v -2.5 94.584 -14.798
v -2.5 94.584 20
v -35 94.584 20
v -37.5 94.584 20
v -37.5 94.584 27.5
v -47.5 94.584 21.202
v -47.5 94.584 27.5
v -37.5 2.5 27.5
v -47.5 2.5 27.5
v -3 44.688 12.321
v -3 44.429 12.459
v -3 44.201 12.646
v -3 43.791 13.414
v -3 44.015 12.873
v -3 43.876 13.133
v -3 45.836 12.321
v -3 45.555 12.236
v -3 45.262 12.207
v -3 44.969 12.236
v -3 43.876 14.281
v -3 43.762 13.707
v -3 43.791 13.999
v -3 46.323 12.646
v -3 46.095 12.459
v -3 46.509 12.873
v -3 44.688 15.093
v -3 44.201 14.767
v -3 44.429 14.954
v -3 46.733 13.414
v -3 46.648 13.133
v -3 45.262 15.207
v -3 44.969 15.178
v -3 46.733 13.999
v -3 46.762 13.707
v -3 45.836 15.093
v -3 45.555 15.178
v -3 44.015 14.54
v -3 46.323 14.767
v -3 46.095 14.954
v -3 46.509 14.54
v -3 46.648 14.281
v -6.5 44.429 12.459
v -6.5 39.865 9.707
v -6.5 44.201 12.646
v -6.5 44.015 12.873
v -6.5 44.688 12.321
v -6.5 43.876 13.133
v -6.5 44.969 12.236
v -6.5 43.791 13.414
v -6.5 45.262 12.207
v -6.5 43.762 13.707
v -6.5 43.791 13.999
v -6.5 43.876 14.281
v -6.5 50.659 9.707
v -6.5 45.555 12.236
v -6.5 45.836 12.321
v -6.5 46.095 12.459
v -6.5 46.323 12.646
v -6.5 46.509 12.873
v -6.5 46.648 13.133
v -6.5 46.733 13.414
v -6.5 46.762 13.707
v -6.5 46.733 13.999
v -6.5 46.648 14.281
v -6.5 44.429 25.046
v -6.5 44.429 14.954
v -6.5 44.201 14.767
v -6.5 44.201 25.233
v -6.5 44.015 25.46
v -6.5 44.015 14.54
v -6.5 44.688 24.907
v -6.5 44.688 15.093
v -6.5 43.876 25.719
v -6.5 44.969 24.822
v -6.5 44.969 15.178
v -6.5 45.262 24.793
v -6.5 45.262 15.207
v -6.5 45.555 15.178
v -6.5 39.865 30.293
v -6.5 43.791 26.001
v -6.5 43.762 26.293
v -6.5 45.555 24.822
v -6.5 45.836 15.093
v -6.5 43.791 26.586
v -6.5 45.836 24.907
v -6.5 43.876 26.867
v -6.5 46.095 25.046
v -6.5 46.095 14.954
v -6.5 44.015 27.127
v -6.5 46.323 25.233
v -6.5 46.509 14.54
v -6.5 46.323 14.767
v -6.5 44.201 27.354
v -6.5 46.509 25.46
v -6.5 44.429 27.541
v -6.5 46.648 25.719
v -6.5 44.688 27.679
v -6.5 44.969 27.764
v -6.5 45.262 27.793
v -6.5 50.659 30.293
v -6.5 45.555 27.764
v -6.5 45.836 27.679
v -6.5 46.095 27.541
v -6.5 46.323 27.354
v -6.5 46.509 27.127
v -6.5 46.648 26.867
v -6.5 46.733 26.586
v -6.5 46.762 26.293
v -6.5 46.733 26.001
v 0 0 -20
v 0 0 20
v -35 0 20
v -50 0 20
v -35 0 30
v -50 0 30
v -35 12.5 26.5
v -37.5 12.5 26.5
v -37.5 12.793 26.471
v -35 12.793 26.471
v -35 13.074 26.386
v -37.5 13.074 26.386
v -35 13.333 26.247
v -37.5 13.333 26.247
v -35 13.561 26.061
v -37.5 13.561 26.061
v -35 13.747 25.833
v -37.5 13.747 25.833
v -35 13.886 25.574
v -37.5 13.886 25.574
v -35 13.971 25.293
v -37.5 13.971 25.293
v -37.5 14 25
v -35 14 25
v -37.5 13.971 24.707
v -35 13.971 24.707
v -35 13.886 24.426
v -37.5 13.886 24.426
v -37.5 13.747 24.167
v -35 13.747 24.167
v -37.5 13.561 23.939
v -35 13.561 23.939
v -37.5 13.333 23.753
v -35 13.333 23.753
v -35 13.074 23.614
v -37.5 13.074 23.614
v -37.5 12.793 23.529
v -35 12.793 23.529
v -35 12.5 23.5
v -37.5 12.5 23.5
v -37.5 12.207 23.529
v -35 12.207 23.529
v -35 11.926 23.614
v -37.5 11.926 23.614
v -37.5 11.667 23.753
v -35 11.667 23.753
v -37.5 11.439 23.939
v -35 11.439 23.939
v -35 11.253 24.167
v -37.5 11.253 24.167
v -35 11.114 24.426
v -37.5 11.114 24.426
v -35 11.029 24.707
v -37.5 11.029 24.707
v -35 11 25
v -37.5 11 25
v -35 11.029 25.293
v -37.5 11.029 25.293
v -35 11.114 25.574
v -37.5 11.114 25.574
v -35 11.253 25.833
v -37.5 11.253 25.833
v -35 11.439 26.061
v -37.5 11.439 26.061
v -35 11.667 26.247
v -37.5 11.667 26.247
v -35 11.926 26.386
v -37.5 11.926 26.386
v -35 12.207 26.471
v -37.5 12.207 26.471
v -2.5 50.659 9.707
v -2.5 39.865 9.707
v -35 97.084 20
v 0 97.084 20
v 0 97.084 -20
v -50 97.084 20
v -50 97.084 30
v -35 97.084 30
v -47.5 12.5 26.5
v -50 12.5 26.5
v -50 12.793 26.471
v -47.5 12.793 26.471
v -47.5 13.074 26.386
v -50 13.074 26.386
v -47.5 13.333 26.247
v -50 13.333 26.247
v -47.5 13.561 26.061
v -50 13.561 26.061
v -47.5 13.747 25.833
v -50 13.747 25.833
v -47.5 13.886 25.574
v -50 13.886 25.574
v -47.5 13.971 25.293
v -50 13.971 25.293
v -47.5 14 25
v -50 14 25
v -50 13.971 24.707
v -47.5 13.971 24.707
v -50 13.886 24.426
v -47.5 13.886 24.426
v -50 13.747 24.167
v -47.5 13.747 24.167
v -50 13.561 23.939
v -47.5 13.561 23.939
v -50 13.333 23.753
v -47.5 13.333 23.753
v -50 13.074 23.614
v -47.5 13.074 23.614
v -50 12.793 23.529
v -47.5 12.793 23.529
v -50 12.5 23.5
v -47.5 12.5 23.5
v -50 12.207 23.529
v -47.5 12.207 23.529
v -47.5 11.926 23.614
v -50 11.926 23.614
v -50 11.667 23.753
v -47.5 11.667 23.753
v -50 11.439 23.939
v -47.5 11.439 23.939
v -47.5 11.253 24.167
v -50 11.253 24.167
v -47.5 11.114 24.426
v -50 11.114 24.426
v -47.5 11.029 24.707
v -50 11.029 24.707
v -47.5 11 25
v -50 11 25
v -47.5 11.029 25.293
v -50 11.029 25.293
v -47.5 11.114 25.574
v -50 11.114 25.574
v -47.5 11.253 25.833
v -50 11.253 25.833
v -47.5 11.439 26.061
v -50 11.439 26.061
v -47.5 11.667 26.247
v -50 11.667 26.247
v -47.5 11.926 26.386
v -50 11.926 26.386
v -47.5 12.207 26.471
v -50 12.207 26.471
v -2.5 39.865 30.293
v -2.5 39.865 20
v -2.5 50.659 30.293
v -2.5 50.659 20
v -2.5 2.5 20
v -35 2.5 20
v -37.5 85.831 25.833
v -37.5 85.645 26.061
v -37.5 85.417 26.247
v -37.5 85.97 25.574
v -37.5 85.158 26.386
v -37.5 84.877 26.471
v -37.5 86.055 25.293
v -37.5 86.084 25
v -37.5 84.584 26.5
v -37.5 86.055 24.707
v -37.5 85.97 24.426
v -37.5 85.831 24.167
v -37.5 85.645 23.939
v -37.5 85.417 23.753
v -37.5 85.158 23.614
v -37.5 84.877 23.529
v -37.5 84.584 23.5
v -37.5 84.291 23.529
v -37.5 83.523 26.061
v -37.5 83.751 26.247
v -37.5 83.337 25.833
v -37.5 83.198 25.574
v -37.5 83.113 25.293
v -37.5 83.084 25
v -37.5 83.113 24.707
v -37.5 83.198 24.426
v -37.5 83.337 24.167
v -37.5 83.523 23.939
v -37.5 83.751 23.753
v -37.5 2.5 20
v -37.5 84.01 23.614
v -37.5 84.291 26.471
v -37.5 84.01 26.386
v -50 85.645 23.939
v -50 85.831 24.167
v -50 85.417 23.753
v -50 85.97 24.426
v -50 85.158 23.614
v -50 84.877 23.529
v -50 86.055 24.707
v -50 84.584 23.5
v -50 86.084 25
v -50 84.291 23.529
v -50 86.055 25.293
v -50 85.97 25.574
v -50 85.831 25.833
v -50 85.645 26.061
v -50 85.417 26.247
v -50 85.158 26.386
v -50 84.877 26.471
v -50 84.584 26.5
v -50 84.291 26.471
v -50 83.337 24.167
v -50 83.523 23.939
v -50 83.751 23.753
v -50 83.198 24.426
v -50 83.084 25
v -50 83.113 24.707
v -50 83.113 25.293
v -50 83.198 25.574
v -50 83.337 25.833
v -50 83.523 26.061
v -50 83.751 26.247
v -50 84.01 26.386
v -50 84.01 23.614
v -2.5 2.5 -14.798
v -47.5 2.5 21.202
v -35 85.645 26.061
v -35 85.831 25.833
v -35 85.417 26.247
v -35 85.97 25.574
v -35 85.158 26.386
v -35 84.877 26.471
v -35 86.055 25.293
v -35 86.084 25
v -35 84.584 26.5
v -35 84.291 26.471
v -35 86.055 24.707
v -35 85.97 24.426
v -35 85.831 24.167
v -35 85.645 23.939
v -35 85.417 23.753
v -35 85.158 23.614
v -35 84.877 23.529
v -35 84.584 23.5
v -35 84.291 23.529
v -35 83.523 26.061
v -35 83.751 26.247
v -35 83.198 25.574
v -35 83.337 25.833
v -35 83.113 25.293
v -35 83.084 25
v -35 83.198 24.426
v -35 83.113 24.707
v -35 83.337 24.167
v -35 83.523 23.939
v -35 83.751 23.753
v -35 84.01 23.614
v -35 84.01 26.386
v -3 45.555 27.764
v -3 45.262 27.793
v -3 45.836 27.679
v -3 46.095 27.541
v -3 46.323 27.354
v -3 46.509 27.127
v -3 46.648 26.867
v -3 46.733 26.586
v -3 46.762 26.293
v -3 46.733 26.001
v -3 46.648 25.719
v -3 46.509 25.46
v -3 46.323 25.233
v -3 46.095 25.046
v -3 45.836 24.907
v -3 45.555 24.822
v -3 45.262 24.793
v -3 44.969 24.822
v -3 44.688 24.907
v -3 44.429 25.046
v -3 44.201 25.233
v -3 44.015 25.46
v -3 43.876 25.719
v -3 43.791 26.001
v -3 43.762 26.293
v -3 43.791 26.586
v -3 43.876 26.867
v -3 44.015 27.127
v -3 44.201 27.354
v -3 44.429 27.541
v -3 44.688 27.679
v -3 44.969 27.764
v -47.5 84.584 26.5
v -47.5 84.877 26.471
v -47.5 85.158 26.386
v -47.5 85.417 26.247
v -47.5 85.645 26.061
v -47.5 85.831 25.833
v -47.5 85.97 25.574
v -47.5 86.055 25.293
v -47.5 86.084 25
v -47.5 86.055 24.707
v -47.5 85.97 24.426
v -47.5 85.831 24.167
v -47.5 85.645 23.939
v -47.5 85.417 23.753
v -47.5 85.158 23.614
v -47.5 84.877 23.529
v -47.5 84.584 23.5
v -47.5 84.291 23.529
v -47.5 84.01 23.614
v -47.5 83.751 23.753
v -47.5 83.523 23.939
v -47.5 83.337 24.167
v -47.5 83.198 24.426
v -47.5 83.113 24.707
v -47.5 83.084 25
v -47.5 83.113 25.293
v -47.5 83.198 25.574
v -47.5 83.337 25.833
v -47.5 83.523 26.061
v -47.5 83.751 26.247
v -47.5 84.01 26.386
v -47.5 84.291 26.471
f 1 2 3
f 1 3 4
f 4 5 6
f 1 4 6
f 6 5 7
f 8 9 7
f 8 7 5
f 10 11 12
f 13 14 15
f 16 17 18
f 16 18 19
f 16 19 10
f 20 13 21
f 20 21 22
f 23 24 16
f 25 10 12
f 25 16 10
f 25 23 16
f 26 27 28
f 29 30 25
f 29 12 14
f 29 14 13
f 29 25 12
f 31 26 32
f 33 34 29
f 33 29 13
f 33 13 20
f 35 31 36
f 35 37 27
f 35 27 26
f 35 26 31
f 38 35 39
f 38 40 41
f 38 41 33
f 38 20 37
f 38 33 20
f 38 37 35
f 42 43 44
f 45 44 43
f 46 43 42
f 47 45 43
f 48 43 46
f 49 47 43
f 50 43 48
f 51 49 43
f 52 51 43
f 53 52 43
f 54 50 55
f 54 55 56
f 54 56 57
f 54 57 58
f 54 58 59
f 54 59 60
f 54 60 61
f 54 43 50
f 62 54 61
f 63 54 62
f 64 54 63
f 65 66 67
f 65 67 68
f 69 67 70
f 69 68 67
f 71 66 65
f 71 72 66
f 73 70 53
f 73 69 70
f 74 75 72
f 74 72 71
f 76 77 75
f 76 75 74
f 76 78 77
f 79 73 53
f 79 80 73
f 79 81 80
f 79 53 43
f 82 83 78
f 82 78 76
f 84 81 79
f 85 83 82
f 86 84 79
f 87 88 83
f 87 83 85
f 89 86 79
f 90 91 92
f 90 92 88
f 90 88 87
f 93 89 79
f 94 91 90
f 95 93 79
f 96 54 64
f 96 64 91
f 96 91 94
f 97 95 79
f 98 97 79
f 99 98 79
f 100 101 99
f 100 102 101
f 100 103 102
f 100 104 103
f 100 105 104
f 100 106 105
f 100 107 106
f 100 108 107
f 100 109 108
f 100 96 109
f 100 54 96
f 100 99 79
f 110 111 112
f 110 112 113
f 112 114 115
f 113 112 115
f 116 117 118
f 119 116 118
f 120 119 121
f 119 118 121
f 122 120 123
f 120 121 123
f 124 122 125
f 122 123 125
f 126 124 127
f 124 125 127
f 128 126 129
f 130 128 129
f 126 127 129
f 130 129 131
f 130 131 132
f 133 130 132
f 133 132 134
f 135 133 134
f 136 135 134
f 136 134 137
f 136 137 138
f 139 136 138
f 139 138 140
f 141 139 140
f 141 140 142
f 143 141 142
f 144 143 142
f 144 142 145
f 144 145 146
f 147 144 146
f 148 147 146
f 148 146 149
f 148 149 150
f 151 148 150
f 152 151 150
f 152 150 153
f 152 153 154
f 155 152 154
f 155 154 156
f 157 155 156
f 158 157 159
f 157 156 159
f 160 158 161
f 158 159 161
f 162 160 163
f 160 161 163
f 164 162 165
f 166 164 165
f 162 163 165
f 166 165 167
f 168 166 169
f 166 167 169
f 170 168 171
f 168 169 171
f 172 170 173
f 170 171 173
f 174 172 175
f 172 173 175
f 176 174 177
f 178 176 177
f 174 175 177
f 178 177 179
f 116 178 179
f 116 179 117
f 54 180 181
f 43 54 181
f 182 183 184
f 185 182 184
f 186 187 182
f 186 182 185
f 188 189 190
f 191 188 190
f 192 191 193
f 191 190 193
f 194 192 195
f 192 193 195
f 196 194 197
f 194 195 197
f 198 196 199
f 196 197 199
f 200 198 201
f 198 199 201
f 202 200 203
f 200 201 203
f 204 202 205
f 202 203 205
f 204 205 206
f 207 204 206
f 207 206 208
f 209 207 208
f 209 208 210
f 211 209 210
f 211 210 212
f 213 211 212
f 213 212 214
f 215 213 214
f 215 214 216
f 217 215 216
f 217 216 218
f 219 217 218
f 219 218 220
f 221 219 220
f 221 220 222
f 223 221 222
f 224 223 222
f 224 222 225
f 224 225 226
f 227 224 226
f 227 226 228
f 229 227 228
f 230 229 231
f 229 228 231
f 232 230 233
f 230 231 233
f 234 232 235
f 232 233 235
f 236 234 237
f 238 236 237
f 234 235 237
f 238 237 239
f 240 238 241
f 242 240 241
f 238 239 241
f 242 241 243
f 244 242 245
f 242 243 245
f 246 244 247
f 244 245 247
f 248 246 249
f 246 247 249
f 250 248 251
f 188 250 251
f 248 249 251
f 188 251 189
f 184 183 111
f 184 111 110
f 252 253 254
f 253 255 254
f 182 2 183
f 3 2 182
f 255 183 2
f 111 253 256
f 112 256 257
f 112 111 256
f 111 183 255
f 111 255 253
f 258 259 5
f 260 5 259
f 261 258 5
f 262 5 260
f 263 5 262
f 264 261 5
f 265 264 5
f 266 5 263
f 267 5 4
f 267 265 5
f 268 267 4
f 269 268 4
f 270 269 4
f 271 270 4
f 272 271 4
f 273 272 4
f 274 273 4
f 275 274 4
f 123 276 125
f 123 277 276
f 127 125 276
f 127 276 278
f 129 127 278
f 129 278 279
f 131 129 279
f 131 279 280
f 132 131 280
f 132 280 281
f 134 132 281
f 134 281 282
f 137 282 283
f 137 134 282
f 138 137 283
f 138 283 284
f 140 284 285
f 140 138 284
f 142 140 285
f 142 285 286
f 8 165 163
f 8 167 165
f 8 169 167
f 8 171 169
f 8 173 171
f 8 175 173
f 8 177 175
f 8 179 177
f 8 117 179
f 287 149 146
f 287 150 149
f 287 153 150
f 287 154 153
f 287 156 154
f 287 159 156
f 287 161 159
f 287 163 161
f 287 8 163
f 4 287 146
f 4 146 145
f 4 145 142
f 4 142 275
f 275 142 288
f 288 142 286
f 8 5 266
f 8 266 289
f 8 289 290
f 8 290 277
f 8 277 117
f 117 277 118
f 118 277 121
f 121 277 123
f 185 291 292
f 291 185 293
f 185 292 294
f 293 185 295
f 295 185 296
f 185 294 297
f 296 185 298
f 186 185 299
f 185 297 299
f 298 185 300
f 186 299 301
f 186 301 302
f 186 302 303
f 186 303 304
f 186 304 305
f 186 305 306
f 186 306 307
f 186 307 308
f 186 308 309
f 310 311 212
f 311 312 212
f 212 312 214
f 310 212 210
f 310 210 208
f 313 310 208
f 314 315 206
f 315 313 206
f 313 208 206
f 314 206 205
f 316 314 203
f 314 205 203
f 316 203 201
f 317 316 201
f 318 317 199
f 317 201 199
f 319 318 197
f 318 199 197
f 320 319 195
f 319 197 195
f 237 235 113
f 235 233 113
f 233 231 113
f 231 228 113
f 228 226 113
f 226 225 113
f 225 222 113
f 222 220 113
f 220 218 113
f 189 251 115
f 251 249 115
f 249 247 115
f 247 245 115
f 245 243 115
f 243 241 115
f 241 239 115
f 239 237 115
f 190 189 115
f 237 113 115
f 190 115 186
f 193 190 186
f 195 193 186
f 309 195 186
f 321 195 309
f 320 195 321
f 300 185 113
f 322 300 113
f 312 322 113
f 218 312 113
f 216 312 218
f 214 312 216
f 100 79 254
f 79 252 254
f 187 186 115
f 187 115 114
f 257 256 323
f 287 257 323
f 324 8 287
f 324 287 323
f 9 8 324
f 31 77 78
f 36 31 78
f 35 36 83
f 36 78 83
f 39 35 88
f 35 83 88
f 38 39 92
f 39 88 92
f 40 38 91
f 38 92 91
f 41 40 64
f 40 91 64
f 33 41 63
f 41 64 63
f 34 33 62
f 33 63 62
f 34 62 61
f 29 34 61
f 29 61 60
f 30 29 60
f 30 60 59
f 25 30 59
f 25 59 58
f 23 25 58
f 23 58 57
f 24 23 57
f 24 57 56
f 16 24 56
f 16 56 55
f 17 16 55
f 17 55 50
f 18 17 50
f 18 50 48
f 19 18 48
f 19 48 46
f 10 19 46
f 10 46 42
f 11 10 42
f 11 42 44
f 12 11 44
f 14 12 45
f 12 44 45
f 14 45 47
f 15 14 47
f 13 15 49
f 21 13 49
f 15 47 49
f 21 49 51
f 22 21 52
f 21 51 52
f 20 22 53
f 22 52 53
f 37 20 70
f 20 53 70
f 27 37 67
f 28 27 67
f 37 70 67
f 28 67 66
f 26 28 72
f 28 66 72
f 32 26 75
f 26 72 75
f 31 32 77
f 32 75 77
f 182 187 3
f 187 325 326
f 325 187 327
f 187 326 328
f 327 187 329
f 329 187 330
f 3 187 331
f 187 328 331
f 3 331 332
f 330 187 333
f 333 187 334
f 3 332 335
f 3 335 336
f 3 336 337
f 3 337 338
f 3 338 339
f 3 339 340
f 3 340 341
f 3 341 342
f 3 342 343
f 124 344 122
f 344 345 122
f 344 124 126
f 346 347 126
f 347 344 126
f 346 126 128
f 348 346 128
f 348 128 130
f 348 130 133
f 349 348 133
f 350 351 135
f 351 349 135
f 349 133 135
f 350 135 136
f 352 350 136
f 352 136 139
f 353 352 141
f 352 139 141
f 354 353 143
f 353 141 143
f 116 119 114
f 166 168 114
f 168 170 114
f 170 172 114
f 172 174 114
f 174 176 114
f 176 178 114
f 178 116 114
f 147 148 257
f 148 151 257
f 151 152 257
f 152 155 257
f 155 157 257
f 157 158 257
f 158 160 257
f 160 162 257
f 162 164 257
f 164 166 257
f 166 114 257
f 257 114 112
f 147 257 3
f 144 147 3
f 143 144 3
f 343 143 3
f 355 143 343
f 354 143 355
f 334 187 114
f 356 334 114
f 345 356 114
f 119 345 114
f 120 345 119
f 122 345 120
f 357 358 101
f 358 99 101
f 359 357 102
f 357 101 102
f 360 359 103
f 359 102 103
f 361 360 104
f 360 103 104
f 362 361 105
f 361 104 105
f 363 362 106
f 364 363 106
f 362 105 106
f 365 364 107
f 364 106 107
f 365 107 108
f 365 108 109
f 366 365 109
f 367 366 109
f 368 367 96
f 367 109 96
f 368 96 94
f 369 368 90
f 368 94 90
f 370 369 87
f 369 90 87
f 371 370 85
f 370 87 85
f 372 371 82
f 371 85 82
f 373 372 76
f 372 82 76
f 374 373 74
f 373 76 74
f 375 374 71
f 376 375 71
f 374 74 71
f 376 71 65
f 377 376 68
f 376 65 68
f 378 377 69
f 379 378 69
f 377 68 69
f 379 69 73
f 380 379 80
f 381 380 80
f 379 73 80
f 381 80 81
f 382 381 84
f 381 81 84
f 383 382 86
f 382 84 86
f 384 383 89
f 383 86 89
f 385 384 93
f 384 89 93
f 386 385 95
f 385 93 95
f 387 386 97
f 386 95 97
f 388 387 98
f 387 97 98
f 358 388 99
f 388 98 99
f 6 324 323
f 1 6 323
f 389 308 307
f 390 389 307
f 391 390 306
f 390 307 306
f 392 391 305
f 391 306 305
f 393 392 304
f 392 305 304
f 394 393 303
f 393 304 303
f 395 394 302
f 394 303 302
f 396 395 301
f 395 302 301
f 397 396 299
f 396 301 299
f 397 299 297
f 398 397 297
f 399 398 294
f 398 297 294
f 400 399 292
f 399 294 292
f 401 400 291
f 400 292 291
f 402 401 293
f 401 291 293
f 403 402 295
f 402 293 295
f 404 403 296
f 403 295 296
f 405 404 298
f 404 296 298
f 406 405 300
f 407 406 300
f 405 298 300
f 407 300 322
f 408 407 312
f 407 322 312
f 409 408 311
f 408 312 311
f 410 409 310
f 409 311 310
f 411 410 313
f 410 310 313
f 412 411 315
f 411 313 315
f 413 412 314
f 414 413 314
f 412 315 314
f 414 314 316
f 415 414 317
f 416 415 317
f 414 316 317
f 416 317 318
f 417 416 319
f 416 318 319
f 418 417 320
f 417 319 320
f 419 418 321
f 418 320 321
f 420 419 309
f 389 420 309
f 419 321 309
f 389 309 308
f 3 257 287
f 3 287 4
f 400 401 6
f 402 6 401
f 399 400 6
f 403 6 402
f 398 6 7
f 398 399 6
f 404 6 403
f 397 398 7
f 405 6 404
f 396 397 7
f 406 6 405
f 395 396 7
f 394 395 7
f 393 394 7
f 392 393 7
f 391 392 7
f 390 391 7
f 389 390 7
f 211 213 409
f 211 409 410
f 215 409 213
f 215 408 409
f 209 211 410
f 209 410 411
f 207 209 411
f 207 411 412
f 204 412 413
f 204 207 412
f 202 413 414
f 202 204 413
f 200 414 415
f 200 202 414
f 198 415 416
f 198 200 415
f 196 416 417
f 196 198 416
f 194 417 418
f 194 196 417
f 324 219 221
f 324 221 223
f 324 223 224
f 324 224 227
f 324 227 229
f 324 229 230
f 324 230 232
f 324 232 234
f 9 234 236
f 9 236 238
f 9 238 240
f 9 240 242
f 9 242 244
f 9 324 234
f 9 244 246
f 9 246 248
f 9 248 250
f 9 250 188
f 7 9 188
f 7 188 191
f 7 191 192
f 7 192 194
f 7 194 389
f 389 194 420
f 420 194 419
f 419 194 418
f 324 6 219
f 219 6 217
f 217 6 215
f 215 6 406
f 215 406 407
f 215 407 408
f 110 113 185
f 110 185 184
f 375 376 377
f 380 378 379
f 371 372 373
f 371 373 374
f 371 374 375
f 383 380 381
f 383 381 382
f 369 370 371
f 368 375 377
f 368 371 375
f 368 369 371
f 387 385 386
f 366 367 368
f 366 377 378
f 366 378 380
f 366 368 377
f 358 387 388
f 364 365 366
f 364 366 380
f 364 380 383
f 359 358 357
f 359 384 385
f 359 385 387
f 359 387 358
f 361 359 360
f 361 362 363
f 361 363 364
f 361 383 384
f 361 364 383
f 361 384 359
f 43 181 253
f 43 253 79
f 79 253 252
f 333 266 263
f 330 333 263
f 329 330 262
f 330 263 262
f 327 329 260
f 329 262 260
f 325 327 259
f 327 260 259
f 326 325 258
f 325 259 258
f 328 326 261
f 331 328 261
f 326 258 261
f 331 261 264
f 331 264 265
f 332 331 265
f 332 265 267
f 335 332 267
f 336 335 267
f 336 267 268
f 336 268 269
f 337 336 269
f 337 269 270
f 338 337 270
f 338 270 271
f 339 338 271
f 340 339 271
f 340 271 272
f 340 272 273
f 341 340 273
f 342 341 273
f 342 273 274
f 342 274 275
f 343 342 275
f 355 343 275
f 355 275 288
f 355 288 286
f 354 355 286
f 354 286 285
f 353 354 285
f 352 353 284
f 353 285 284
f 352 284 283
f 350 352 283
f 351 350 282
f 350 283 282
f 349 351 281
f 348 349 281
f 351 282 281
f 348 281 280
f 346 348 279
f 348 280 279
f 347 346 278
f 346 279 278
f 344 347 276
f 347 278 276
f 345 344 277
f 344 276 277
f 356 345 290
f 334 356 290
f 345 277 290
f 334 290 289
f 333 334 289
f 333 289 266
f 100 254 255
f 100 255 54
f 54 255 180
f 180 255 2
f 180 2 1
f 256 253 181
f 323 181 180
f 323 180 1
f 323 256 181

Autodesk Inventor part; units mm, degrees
ref_plane "YZ Plane" through (0, 0, 0) normal (1, 0, 0) x (0, 1, 0)
ref_plane "XZ Plane" through (0, 0, 0) normal (0, 1, 0) x (-1, 0, 0)
ref_plane "XY Plane" through (0, 0, 0) normal (0, 0, 1) x (1, 0, 0)
sketch "Esboço1" plane through (0, 0, 0) normal (0, 1, 0) x (-1, 0, 0)
  line L0 (0, 20) -> (0, -20)
  line L1 (0, 20) -> (50, 20)
  line L2 (50, 20) -> (0, -20)
  line L3 (50, 20) -> (50, 30)
  line L4 (50, 30) -> (35, 30)
  line L5 (35, 30) -> (35, 20)
  point P0 (0, 0)
  dimension "d0" = 40
  dimension "d1" = 50
  dimension "d2" = 10
  dimension "d3" = 15
extrude "Extrusão1" add sketch "Esboço1" along normal blind 97.084
shell "Casca1" thickness 2.5 removed faces 1 at (-23.3333, 32.3613, 20)
sketch "Esboço2" plane through (-50, 0, 20) normal (-1, 0, 0) x (0, 0, 1)
  line L0 (10, 97.084) -> (0, 97.084) projected
  line L1 (0, 97.084) -> (5, 97.084)
  line L2 (5, 97.084) -> (5, 84.584)
  circle A0 centre (5, 84.584) radius 1.5
  line L3 (10, 0) -> (0, 0) projected
  line L4 (0, 0) -> (5, 0)
  line L5 (5, 0) -> (5, 12.5)
  circle A1 centre (5, 12.5) radius 1.5
  point P0 (-20, 0)
  dimension "d7" = 5
  dimension "d8" = 12.5
  dimension "d9" = 3
  dimension "d10" = 5
  dimension "d11" = 12.5
  dimension "d12" = 3
extrude "Extrusão2" cut sketch "Esboço2" against normal blind 102.84
thread "Rosca1" size "M3x0.5" class "6H" standard "ANSI Metric M Profile" length 20
thread "Rosca2" size "M3x0.5" class "6H" standard "ANSI Metric M Profile" length 20
thread "Rosca3" size "M3x0.5" class "6H" standard "ANSI Metric M Profile" length 20
thread "Rosca4" size "M3x0.5" class "6H" standard "ANSI Metric M Profile" length 20
sketch "Esboço3" plane through (0, 97.084, 0) normal (0, 1, 0) x (1, 0, 0)
  line L0 (-50, -30) -> (-35, -30) projected
  point P0 (0, 0)
  point P1 (-35, -20)
  dimension "d23" = 10
sketch "Esboço4" plane through (-50, 0, 20) normal (-1, 0, 0) x (0, 0, 1)
  line L0 (0, 97.084) -> (10, 97.084) projected
  line L1 (0, 0) -> (10, 0) projected
  point P0 (-20, 0)
  dimension "d24" = 97.084
sketch "Esboço5" plane through (0, 97.084, 0) normal (0, 1, 0) x (1, 0, 0)
  point P0 (0, 0)
sketch "Esboço6" plane through (-2.5, 2.5, 20) normal (-1, 0, 0) x (0, 0, 1)
  line L0 (-10.2933, 37.3647) -> (10.2933, 37.3647)
  line L1 (10.2933, 37.3647) -> (10.2933, 48.1592)
  line L2 (10.2933, 48.1592) -> (-10.2933, 48.1592)
  line L3 (-10.2933, 48.1592) -> (-10.2933, 37.3647)
  line L4 (0, 92.084) -> (0, 0) projected
  line L5 (-10.2933, 37.3647) -> (10.2933, 48.1592) construction
  line L6 (10.2933, 37.3647) -> (-10.2933, 48.1592) construction
  point P0 (-20, -2.5)
  point P1 (0, 42.762)
extrude "Extrusão3" add sketch "Esboço6" along normal blind 4
sketch "Esboço7" plane through (-6.5, 2.5, 20) normal (-1, 0, 0) x (0, 0, 1)
  line L0 (-10.2933, 48.1592) -> (-10.2933, 37.3647) projected
  line L1 (-10.2933, 42.762) -> (-6.2933, 42.762)
  line L2 (10.2933, 37.3647) -> (10.2933, 48.1592) projected
  line L3 (10.2933, 42.762) -> (6.2933, 42.762)
  circle A0 centre (-6.2933, 42.762) radius 1.5
  circle A1 centre (6.2933, 42.762) radius 1.5
  point P0 (-20, -2.5)
  dimension "d27" = 4
  dimension "d28" = 4
  dimension "d29" = 3
  dimension "d30" = 3
extrude "Extrusão4" cut sketch "Esboço7" against normal blind 3.5
thread "Rosca5" size "M3x0.5" class "6H" standard "ANSI Metric M Profile" length 20
thread "Rosca6" size "M3x0.5" class "6H" standard "ANSI Metric M Profile" length 20
properties part number "Rampa 1"
